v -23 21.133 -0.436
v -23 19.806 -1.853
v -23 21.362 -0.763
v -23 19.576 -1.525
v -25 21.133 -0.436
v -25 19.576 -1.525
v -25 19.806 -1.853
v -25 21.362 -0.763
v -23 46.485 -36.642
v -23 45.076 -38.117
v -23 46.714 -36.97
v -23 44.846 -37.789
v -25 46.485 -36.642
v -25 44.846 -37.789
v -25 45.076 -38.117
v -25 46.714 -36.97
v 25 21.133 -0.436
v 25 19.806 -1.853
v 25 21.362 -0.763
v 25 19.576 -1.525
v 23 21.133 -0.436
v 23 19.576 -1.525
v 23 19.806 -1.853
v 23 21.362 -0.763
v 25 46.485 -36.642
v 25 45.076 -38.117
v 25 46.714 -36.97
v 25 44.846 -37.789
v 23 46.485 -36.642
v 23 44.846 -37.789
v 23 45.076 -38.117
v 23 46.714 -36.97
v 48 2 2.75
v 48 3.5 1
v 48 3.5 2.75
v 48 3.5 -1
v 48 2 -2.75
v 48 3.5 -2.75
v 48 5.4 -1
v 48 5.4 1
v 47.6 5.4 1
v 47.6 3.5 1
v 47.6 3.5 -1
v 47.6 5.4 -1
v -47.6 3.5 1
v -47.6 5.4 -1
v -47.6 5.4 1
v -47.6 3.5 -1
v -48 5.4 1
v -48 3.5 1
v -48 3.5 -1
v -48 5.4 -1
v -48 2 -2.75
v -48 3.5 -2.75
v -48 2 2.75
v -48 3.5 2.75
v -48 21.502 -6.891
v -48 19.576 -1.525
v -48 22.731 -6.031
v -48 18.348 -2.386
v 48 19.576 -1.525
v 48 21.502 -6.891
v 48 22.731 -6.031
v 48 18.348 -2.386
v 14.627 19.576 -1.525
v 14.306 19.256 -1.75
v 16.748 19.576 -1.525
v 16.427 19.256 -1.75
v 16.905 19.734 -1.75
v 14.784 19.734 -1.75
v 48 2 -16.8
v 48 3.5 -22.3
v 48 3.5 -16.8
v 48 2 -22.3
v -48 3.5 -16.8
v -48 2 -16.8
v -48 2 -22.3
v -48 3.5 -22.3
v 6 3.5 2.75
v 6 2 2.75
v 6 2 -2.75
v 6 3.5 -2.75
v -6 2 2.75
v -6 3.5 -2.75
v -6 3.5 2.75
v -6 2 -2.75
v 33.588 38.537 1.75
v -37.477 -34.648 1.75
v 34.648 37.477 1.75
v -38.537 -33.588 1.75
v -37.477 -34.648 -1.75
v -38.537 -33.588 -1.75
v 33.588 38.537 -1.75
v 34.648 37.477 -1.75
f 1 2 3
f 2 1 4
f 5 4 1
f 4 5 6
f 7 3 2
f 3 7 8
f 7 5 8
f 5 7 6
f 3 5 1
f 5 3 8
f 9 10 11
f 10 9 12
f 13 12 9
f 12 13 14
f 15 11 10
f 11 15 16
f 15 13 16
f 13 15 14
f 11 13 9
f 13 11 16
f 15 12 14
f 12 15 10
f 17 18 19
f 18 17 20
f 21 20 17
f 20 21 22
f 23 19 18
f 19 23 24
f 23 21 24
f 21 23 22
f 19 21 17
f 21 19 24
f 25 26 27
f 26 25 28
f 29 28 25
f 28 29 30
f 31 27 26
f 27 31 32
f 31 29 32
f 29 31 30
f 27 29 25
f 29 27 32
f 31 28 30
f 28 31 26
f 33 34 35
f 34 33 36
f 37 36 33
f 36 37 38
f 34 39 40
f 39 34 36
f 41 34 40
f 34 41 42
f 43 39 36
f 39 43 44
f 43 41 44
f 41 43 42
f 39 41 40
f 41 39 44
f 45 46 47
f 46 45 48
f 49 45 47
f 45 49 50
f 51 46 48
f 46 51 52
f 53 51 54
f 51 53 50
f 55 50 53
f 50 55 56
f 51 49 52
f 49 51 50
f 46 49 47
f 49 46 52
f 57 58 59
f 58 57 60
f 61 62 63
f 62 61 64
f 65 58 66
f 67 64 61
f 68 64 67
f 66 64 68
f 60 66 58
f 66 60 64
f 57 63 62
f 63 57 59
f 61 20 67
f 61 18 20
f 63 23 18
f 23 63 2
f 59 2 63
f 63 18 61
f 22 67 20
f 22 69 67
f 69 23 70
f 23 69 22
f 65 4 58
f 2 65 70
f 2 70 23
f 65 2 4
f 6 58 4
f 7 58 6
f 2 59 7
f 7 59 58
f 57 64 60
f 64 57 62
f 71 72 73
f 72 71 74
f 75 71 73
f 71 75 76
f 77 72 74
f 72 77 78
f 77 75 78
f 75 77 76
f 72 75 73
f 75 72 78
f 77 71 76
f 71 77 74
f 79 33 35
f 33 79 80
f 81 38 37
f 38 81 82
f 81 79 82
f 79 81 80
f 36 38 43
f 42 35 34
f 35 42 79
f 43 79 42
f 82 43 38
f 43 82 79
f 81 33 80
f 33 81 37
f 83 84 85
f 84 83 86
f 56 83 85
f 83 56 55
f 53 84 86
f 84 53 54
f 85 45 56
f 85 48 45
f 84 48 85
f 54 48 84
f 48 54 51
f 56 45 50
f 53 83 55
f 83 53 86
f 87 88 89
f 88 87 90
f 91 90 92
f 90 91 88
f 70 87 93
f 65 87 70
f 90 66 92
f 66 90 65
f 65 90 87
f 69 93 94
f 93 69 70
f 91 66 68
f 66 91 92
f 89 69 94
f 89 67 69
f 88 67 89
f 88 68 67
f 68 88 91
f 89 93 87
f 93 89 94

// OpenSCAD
// file: ../wattplot_params.scad
// =============================================================================
// wattplot_params.scad -- mirror of wattplot_params.py
// =============================================================================
//
// DO NOT EDIT THESE NUMBERS WITHOUT UPDATING wattplot_params.py AND
// firmware/tests/test_openscad_params.py.
//
// The Python source of truth is wattplot_params.py at the repo root.
// This file is a hand-maintained mirror so the OpenSCAD models can
// render without Python. A CI test (test_openscad_params.py) reads
// both and fails if any number has drifted.
//
// If you change a value here, change it in wattplot_params.py first
// and update the test expectations in test_openscad_params.py. The
// commit message should reference the param name (e.g.
// "scad: bump POSTS.height_in to 78 for v3.1 storm margin").
//
// All dimensions are in inches. OpenSCAD's $fn controls mesh
// resolution -- 64 gives a clean STL that's about 2 MB at this
// model's complexity.

// ---------- LOCATION ----------
location_latitude  = 33.45;     // Phoenix, AZ
location_longitude = -112.07;
location_elevation_m = 337;
location_design_wind_mph = 115.0; // ASCE 7-22, Risk Cat II 700-yr

// ---------- PLANTER LIMITS ----------
max_planter_L_in = 96.0;          // 8 ft stock, no waste on long rails
max_planter_W_in = 60.0;          // 5 ft (8 ft cross-cut, 2 cross-rails per board)

// ---------- BED (planter, ballasted) ----------
bed_outer_L_in       = 96.0;       // 8 ft (capped at max_planter_L_in)
bed_outer_W_in       = 44.6;       // matches panel width
bed_wall_thk_in      = 0.75;       // 1x6 cedar (3/4" actual)
bed_wall_h_in        = 27.5;       // 5 courses of 1x6 (5.5" actual)
                                   //   wind-sized: SF_overturning 2.55 at 35°
bed_soil_fill_in     = 25.5;       // 2" freeboard below the rim
                                   //   ~60 cu ft = 2.2 cu yd = ~4,000 lb
bed_skid_h_in        = 1.5;        // walls rest on 2x4 footers
bed_skid_side_in     = 3.5;        // 4x nominal

// ---------- BED WALL (1x6 cedar skin over 2x4 cleats) ----------
wall_skin_thk_in   = 0.75;
wall_course_h_in   = 5.5;
wall_courses       = 5;            // 5 x 5.5" = 27.5" wall
wall_cleat_thk_in  = 1.5;          // 2x4 actual
wall_cleat_wid_in  = 3.5;          // 2x4 actual
wall_cleats_long   = 5;            // per long wall
wall_cleats_short  = 3;            // per short wall
wall_header_thk_in = 1.5;         // 2x4 on wide face
wall_header_wid_in = 3.5;

// ---------- POSTS (4x4 PT, 72" tall, walk-under canopy) ----------
post_thk_in  = 3.5;               // 4x4 actual
post_height_in = 72.0;            // 6 ft -- walk-under / reach-under
post_count   = 4;
post_rail_thk_in = 1.5;          // 2x6 on post tops
post_rail_wid_in = 5.5;

// ---------- PANEL (LONGi Hi-MO X10 620W default) ----------
panel_L_in        = 97.0;         // 8.08 ft (overhangs bed 0.5"/side)
panel_W_in        = 44.6;         // 3.72 ft
panel_thk_in      = 1.4;
panel_mass_lb     = 65.0;
panel_wattage     = 620;
panel_tilt_deg    = 35.0;         // 0 = flat, 35 = max (wind-limited)

// ---------- CONTROL (tilt cap + PI setpoint) ----------
control_max_tilt_deg  = 35.0;     // STRUCTURAL cap. See ADR-001.
control_target_current_A = 0.5;
control_hard_current_limit_A = 2.5;

// ---------- FRAME (perimeter around the panel) ----------
frame_long_rail_thk_in   = 1.5;    // 2x6 actual
frame_long_rail_wid_in   = 5.5;
frame_long_rail_length_in = 96.0;  // 8 ft stock, no waste

frame_cross_rail_thk_in   = 1.5;   // 2x6 actual
frame_cross_rail_wid_in   = 5.5;
frame_cross_rail_length_in = 42.0; // 2x6x8ft cut to 42"

frame_brace_thk_in   = 1.5;         // 2x4 actual
frame_brace_wid_in   = 3.5;
frame_brace_length_in = 102.0;     // 2x4x10ft cut to 102"

// ---------- HINGES + PANEL CLAMPS ----------
hinge_leaf_in    = 4.0;            // 4"x4" leaf, 1/2" pin
hinge_pin_d_in    = 0.5;
hinge_count      = 4;
hinge_spacing_in = 22.0;           // 22" o.c.
hinge_rod_length_in = 72.0;        // 1/2" x 72" steel rod (HD)

panel_clamp_length_in = 2.0;       // IronRidge mid-clamp, 35mm channel
panel_clamp_height_in = 2.0;
panel_clamp_thk_in   = 0.4;
panel_clamps_per_long_rail  = 2;
panel_clamps_per_cross_rail = 1;

// ---------- ACTUATOR MOUNT ----------
actuator_block_thk_in  = 1.5;      // 2x6 actual
actuator_block_wid_in  = 5.5;
actuator_block_length_in = 6.0;
actuator_stroke_in     = 4.0;       // 12V linear actuator
actuator_width_in      = 2.0;       // body width (for clearance check)
actuator_height_in     = 2.5;

// ---------- DERIVED (don't change) ----------
// Bed is sized so the panel overhangs the rails by 0.5" per side.
// The panel mid-clamps grip the aluminum frame, not the glass.
bed_inner_L_in = bed_outer_L_in - 2 * post_thk_in;
bed_inner_W_in = bed_outer_W_in - 2 * wall_skin_thk_in;
// Wall sits on top of skid; rim = wall + skid.
bed_rim_h_in = bed_wall_h_in + bed_skid_h_in;
// Panel frame offset above the bed rail (clearance for the clamp).
panel_clearance_in = 2.0;         // 2" above the rail top

// Render resolution: $fn controls segment count for curves.
// 64 gives a clean STL ~2 MB. Lower for fast preview, higher for
// 3D printing.
$fn = 64;
// main file
// =============================================================================
// parts/frame.scad -- 2x6 perimeter around the panel + 2x4 diagonal brace + 6 clamps
// =============================================================================
//
// Tilts with the panel. Hinged on the south; the diagonal brace carries
// the load at 90 deg tilt (not used at 35 deg but modeled for
// completeness). The 6 aluminum mid-clamps grip the panel frame.

include <../wattplot_params.scad>

module frame_assembly(show_clamps=true) {
    hinge_y = bed_rim_h_in + 0.5;
    hinge_z = -bed_outer_W_in/2 + 0.5;
    panel_pivot_x = 0;
    color(col_frame_default)
    translate([panel_pivot_x, hinge_y, hinge_z])
        rotate([panel_tilt_deg, 0, 0])
            // Long rails (X axis, panel length)
            translate([0, panel_clearance_in + frame_long_rail_thk_in/2, bed_outer_W_in/2 - frame_long_rail_wid_in/2])
                cube([frame_long_rail_length_in, frame_long_rail_thk_in, frame_long_rail_wid_in], center=true);
            translate([0, panel_clearance_in + frame_long_rail_thk_in/2, -bed_outer_W_in/2 + frame_long_rail_wid_in/2])
                cube([frame_long_rail_length_in, frame_long_rail_thk_in, frame_long_rail_wid_in], center=true);
            // Cross rails (Z axis, between long rails)
            translate([ bed_outer_L_in/2 - frame_cross_rail_length_in/2, panel_clearance_in + frame_cross_rail_thk_in/2, 0])
                cube([frame_cross_rail_length_in, frame_cross_rail_thk_in, frame_cross_rail_wid_in], center=true);
            translate([-bed_outer_L_in/2 + frame_cross_rail_length_in/2, panel_clearance_in + frame_cross_rail_thk_in/2, 0])
                cube([frame_cross_rail_length_in, frame_cross_rail_thk_in, frame_cross_rail_wid_in], center=true);
            // Diagonal brace: 2x4, butts into the long rails
            // (only structural at 90 deg tilt, but always there)
            rotate([0, 0, 45])
                translate([0, panel_clearance_in + frame_brace_thk_in/2, 0])
                    cube([frame_brace_length_in, frame_brace_thk_in, frame_brace_wid_in], center=true);
    
    if (show_clamps)
    color(col_hinge_default)
    translate([panel_pivot_x, hinge_y, hinge_z])
        rotate([panel_tilt_deg, 0, 0])
        for (i = [0:panel_clamps_per_long_rail-1]) {
            x = -bed_outer_L_in/4 + i * (bed_outer_L_in / 2) /
                  max(1, panel_clamps_per_long_rail - 1);
            translate([x, panel_clearance_in + panel_thk_in + panel_clamp_height_in/2, bed_outer_W_in/2 - panel_clamp_thk_in/2])
                cube([panel_clamp_length_in, panel_clamp_height_in, panel_clamp_thk_in], center=true);
            translate([x, panel_clearance_in + panel_thk_in + panel_clamp_height_in/2, -bed_outer_W_in/2 + panel_clamp_thk_in/2])
                cube([panel_clamp_length_in, panel_clamp_height_in, panel_clamp_thk_in], center=true);
        }
        for (i = [0:panel_clamps_per_cross_rail-1]) {
            z = 0;
            translate([ bed_outer_L_in/2 - panel_clamp_thk_in/2, panel_clearance_in + panel_thk_in + panel_clamp_height_in/2, z])
                cube([panel_clamp_thk_in, panel_clamp_height_in, panel_clamp_length_in], center=true);
            translate([-bed_outer_L_in/2 + panel_clamp_thk_in/2, panel_clearance_in + panel_thk_in + panel_clamp_height_in/2, z])
                cube([panel_clamp_thk_in, panel_clamp_height_in, panel_clamp_length_in], center=true);
        }
}

col_frame_default = [0.90, 0.90, 0.88];
col_hinge_default = [0.60, 0.60, 0.65];

if (is_undef($use_only)) {
    $fn = 64;
    frame_assembly();
}
